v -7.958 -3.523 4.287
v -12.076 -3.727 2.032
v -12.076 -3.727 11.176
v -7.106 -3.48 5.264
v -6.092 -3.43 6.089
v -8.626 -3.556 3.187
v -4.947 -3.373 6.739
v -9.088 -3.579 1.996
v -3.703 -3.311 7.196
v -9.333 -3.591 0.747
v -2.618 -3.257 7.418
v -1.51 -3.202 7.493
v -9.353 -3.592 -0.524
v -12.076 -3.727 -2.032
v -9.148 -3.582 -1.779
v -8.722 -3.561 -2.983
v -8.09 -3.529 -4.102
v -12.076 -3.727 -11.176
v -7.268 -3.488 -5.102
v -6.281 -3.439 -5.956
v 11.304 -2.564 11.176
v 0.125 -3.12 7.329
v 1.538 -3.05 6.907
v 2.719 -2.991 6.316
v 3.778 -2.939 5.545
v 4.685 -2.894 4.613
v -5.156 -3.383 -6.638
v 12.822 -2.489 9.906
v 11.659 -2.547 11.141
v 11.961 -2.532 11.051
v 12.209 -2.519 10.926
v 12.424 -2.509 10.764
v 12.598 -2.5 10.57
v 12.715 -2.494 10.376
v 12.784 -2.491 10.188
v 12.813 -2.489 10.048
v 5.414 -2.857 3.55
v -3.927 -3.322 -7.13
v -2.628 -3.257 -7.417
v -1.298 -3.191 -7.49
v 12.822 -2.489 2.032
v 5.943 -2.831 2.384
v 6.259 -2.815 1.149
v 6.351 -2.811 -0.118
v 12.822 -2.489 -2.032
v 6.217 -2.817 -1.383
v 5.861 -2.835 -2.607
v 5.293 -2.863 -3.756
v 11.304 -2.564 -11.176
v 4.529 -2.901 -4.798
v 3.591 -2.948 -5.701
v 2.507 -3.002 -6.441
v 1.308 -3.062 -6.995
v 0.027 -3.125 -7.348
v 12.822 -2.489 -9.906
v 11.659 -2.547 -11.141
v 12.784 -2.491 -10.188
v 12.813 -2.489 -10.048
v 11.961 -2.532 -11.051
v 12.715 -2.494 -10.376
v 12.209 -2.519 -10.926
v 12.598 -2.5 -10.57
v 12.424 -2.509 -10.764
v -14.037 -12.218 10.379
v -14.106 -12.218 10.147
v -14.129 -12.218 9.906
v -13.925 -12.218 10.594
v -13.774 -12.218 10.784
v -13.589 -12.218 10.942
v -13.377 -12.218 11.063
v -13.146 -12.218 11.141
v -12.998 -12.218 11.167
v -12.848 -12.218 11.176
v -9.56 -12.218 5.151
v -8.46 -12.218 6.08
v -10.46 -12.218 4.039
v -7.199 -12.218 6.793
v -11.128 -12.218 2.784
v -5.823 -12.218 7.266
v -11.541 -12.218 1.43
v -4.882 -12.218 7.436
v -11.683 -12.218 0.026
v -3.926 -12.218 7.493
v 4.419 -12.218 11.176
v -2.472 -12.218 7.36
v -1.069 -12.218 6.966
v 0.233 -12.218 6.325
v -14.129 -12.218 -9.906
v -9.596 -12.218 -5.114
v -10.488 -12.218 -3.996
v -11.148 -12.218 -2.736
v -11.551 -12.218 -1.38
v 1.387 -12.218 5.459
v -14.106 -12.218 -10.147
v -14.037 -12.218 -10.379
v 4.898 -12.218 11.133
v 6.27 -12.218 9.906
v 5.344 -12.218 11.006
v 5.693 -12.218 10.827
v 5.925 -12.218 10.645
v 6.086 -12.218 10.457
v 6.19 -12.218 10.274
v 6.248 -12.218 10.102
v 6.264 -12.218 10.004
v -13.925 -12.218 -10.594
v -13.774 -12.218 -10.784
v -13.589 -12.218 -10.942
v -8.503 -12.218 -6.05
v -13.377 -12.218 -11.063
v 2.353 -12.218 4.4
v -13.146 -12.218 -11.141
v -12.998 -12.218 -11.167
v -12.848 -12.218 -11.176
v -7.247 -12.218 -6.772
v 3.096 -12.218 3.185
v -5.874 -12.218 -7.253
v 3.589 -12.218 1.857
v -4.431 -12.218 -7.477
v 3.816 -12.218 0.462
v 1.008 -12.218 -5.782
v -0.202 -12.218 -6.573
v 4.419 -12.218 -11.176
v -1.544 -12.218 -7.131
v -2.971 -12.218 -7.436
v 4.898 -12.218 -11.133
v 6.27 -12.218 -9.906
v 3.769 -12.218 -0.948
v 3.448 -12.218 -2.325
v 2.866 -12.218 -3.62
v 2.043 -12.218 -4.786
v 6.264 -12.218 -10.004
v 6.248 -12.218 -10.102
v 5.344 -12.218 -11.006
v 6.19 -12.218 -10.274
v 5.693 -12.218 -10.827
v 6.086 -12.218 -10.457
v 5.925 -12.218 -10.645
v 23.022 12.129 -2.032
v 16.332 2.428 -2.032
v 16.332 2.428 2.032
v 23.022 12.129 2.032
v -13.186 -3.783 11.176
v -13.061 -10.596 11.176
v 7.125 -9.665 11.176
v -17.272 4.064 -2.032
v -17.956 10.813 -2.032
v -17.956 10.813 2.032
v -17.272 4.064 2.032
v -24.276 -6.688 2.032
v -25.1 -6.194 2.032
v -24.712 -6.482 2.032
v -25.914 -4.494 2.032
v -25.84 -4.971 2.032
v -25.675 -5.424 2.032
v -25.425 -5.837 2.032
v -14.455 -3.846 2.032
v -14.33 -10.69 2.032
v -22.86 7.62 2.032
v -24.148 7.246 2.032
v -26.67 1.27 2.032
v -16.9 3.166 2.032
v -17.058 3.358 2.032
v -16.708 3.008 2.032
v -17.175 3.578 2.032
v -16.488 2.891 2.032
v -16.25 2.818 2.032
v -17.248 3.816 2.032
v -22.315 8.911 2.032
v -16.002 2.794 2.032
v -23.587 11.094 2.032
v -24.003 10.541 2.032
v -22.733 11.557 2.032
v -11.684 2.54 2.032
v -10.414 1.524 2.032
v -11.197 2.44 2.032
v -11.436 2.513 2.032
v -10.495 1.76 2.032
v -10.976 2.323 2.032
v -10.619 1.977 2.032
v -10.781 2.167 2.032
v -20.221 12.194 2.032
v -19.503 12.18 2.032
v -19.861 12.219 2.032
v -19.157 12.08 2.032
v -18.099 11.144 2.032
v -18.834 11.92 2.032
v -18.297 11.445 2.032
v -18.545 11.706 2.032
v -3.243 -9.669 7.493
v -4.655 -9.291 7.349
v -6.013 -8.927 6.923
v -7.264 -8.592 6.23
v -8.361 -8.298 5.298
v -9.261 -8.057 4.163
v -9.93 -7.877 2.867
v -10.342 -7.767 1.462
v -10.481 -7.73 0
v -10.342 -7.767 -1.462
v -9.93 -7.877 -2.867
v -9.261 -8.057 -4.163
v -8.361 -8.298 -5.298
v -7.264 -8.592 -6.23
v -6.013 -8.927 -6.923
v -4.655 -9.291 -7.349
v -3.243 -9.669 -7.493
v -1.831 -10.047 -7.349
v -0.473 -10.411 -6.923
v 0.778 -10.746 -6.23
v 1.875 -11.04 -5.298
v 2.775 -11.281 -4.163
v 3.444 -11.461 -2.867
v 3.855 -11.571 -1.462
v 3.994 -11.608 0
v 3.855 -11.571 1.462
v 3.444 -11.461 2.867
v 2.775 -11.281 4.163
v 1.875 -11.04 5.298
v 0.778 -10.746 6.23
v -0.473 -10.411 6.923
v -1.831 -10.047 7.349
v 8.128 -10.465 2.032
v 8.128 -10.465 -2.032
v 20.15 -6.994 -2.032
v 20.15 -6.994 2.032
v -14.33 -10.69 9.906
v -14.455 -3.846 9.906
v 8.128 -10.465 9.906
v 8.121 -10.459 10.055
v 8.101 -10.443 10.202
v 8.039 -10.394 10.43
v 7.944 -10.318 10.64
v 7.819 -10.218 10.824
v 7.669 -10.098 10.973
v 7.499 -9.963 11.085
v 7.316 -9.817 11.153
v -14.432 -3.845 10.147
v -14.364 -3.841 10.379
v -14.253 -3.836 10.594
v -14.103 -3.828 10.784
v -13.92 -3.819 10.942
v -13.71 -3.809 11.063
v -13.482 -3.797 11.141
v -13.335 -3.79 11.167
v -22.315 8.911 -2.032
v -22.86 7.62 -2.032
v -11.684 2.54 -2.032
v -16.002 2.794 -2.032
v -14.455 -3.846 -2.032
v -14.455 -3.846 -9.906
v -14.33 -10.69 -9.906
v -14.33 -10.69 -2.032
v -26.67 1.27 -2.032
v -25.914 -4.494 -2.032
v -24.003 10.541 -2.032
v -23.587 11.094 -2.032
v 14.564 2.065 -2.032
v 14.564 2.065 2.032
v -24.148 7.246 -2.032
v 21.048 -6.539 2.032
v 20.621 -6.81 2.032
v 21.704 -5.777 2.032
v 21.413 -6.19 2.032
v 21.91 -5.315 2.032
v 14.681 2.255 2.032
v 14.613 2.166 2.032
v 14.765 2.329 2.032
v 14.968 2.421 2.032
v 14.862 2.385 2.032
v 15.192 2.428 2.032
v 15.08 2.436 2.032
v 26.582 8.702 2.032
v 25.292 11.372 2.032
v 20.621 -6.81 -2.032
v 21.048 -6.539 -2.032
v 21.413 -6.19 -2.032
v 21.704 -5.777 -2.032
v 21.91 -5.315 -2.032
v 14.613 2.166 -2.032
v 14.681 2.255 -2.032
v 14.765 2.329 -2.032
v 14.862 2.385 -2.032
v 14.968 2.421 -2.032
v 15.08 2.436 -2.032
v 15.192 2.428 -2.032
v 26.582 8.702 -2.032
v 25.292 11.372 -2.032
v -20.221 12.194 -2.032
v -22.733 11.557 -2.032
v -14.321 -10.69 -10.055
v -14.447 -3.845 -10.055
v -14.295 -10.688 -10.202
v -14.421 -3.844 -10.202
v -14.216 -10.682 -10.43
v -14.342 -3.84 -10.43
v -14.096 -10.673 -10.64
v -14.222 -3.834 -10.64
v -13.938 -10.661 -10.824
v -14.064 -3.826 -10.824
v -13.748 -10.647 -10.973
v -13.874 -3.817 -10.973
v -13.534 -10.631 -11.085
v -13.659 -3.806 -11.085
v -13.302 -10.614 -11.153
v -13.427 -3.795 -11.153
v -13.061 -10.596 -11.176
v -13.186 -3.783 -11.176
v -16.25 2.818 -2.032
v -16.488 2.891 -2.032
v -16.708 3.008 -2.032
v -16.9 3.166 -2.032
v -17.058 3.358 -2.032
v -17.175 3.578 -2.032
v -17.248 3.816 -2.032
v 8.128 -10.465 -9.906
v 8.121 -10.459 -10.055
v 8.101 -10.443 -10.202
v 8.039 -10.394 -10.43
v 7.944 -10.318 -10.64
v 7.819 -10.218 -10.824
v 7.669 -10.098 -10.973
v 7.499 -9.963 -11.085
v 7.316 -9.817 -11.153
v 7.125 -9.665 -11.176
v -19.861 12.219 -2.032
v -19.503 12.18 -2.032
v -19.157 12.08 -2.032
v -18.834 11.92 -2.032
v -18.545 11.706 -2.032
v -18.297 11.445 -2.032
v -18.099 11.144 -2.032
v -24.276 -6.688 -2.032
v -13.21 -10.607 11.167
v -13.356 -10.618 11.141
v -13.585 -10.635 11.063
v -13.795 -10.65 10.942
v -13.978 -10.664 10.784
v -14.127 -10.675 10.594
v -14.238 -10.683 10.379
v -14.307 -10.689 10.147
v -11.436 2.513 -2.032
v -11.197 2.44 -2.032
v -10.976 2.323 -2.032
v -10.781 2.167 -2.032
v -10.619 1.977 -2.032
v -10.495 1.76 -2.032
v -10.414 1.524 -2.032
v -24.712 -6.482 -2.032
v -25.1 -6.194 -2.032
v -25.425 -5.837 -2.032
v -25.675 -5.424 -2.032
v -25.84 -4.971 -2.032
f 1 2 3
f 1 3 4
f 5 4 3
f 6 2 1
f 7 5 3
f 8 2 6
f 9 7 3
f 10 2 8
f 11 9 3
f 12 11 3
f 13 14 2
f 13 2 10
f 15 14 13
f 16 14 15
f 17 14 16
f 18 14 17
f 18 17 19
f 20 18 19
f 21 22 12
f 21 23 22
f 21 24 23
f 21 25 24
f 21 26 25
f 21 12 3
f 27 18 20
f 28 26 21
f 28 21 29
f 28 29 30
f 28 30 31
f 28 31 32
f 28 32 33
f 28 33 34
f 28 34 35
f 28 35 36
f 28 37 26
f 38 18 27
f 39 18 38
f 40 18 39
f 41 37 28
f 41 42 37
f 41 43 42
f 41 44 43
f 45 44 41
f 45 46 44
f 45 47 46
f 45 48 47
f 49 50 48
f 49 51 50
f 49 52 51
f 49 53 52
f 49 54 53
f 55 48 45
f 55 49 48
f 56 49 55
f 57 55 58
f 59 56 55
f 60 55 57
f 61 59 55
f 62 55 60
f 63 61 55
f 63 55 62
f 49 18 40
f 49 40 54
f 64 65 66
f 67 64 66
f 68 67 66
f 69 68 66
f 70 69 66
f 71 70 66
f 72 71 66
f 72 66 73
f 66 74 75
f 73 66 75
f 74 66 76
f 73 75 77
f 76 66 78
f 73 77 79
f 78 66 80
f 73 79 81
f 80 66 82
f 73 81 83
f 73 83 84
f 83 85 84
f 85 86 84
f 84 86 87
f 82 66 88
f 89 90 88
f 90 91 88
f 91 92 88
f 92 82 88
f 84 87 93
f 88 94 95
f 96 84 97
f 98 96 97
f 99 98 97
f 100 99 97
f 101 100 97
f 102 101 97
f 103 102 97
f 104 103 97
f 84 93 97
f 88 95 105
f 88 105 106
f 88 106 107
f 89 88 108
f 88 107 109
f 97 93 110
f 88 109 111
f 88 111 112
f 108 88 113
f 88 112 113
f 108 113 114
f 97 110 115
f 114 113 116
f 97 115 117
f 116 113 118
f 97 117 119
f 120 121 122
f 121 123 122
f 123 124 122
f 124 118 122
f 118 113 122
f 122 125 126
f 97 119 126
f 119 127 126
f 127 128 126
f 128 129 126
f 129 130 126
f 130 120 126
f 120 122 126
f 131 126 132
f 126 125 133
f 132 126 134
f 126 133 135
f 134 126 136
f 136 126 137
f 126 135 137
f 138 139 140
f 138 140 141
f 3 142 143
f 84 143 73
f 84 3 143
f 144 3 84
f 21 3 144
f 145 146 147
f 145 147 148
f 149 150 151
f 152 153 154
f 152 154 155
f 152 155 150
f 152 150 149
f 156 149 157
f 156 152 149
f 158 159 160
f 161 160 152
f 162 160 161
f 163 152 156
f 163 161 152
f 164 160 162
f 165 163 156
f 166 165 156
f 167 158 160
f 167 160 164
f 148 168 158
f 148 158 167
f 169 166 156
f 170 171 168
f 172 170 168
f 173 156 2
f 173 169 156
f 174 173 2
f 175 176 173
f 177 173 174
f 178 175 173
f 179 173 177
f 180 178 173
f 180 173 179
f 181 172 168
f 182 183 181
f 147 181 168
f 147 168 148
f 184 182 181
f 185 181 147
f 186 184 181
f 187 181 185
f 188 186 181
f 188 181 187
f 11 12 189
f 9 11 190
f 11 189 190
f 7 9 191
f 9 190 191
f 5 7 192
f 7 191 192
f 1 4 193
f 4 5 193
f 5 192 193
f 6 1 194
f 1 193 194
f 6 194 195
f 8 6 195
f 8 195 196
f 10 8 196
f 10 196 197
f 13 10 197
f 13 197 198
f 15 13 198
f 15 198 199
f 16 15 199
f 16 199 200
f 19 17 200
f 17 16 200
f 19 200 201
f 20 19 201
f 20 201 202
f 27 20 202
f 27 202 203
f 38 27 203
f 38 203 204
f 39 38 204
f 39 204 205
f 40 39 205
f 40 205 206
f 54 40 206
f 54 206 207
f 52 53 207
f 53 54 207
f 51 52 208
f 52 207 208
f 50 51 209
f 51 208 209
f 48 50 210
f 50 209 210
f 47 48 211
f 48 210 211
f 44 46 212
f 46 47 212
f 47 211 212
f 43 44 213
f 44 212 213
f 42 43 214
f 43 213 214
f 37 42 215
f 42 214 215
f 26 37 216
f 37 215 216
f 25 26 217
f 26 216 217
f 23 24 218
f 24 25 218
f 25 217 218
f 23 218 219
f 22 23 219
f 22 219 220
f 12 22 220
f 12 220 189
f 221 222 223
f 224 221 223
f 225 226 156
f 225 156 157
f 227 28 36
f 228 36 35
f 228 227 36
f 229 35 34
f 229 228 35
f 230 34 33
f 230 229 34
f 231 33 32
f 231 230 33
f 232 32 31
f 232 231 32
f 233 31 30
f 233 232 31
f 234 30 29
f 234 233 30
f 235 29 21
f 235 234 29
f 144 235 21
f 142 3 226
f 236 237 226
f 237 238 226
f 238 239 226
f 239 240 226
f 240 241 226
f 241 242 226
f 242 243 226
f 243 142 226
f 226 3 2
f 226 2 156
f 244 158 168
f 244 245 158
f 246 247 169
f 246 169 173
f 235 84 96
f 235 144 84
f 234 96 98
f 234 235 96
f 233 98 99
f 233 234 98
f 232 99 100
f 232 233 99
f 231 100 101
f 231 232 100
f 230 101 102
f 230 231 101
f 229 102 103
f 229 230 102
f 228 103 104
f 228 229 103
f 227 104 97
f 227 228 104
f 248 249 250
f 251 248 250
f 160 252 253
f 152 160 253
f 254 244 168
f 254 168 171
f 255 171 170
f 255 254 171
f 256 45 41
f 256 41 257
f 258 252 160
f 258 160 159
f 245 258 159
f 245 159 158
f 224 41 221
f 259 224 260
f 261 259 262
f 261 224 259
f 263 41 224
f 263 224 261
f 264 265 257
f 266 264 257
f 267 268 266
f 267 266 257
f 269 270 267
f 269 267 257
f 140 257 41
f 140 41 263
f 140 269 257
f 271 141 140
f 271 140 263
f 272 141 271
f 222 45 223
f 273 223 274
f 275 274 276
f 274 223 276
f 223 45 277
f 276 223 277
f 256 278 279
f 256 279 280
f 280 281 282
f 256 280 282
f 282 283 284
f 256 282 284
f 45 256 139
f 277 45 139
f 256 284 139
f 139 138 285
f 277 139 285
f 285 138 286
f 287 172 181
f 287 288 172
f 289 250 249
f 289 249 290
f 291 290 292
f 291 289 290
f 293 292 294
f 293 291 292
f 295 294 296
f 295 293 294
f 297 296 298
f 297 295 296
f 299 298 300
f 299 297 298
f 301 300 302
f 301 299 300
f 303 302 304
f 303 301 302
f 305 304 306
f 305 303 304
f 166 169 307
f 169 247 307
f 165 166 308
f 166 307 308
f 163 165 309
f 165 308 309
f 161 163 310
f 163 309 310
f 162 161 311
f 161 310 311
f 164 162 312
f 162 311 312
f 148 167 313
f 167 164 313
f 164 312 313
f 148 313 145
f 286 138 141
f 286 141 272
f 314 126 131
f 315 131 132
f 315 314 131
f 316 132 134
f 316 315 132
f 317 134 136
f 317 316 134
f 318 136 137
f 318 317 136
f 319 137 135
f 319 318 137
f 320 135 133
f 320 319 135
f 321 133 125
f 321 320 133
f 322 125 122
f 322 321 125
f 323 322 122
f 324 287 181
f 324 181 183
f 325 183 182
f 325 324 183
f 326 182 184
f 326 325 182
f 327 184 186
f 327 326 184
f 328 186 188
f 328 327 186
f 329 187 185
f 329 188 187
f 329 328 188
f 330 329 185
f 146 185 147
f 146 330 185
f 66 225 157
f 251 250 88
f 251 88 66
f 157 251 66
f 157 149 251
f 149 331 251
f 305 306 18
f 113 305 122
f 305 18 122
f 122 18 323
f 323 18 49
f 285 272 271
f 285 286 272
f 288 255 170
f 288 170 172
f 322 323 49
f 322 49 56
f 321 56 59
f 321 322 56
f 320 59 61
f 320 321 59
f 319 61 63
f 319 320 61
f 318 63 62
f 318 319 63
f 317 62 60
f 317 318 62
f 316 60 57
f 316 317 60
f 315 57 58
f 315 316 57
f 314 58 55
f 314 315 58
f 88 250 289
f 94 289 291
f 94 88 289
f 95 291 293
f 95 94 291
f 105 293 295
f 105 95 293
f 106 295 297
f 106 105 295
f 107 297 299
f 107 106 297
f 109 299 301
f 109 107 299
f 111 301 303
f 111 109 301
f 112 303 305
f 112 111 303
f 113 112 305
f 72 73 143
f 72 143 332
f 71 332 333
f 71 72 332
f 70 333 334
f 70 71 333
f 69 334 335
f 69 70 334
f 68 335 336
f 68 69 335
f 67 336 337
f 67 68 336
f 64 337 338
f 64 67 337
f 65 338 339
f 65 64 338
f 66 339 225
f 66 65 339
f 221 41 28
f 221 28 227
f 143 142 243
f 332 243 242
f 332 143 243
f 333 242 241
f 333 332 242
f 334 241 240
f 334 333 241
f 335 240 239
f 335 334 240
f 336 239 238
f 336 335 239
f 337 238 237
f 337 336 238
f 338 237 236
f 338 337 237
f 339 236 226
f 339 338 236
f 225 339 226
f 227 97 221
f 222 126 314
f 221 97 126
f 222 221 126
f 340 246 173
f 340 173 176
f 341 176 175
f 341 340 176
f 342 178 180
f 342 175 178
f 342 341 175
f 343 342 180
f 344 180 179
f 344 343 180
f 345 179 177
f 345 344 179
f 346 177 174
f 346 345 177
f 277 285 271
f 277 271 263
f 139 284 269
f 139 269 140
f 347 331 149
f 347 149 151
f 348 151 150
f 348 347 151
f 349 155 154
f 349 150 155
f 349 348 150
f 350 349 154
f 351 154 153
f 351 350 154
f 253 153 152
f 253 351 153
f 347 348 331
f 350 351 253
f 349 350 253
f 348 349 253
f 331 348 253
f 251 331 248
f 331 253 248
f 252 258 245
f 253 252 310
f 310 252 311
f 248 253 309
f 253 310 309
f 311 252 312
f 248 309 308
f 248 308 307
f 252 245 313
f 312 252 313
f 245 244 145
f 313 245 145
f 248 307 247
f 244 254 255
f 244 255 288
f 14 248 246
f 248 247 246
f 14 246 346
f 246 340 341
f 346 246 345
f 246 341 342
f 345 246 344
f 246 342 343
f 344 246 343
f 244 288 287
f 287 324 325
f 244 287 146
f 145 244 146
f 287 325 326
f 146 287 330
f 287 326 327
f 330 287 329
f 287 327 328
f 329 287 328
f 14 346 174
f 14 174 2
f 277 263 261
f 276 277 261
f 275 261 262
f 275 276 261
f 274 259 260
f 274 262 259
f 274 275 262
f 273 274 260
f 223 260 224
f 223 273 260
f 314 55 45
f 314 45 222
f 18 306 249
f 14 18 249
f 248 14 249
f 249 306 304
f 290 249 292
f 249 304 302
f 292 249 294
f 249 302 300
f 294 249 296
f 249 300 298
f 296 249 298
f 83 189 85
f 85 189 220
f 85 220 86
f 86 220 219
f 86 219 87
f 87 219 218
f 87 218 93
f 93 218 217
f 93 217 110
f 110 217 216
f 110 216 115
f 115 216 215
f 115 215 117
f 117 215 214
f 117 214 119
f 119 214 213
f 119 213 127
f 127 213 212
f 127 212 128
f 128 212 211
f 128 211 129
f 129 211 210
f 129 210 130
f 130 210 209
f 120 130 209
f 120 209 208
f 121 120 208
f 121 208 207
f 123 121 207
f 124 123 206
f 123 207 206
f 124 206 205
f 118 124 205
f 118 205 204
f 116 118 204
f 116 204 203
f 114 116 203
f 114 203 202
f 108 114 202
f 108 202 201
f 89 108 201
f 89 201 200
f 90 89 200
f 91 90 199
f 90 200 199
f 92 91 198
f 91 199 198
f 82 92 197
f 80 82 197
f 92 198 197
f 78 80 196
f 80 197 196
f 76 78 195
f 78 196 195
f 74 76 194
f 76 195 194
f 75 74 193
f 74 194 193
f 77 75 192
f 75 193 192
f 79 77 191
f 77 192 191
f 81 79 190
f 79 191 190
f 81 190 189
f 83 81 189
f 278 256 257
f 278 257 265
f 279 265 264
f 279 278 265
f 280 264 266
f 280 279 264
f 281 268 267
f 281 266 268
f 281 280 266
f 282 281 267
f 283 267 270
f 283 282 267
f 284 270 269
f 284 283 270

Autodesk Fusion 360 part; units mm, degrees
sketch "Sketch1" plane through (0, 0, 0) normal (0, 0, 1) x (1, 0, 0)
  line L0 (-26.67, 1.27) -> (-24.1476, 7.2462)
  line L1 (-24.1476, 7.2462) -> (-22.86, 7.62)
  line L2 (-22.86, 7.62) -> (-22.315, 8.9113)
  line L3 (-22.315, 8.9113) -> (-24.003, 10.541)
  line L4 (-23.5873, 11.0942) -> (-22.733, 11.557)
  line L5 (-22.733, 11.557) -> (-20.2207, 12.194)
  arc A0 (-17.9561, 10.8132) -> (-20.2207, 12.194) centre (-19.9, 10.1725) ccw
  arc A1 (-17.272, 4.064) -> (-16.002, 2.794) centre (-16.002, 4.064) ccw
  arc A2 (-10.414, 1.524) -> (-11.684, 2.54) centre (-11.7021, 1.2156) ccw
  line L6 (-16.002, 2.794) -> (-11.684, 2.54)
  line L7 (-17.9561, 10.8132) -> (-17.272, 4.064)
  line L8 (-10.414, 1.524) -> (-12.0756, -3.7274)
  line L9 (-12.0756, -3.7274) -> (12.8223, -2.4887)
  line L10 (12.8223, -2.4887) -> (14.564, 2.0647)
  arc A3 (15.1915, 2.428) -> (14.564, 2.0647) centre (15.0967, 1.8682) ccw
  line L11 (15.1915, 2.428) -> (16.3321, 2.428)
  line L12 (16.3321, 2.428) -> (23.0225, 12.1287)
  line L13 (23.0225, 12.1287) -> (25.292, 11.3722)
  line L14 (25.292, 11.3722) -> (26.5825, 8.7022)
  line L15 (26.5825, 8.7022) -> (21.9101, -5.3151)
  arc A4 (20.1504, -6.9936) -> (21.9101, -5.3151) centre (19.4463, -4.4938) ccw
  arc A5 (-25.9136, -4.4938) -> (-24.2756, -6.6881) centre (-23.4373, -4.3537) ccw
  line L16 (-26.67, 1.27) -> (-25.9136, -4.4938)
  line L17 (-24.2756, -6.6881) -> (-14.3296, -10.6903)
  line L18 (-14.3296, -10.6903) -> (-14.1291, -12.218)
  line L19 (-14.1291, -12.218) -> (6.2698, -12.218)
  line L20 (6.2698, -12.218) -> (8.1283, -10.465)
  line L21 (8.1283, -10.465) -> (20.1504, -6.9936)
  line L22 (-12.0756, -3.7274) -> (-14.4554, -3.8458)
  line L23 (-14.4554, -3.8458) -> (-14.3296, -10.6903)
  line L24 (12.8223, -2.4887) -> (8.1283, -10.465)
  line L25 (-24.003, 10.541) -> (-23.5873, 11.0942)
extrude "Extrude1" add sketch "Sketch1" along normal mid plane 4.064 contours L0 L1 L2 L3 L4 L5 A0 A1 A2 L6 L7 L8 A5 L16 L17 L22 L23 L25 | L10 A3 L11 L12 L13 L14 L15 A4 L21 L24 makes body 1 at (-19.0192, -1.7813, 2.032) makes body 2 at (21.6083, 1.9384, 2.032)
extrude "Extrude2" add sketch "Sketch1" along normal mid plane 22.352 contours L9 L18 L19 L20 L22 L23 L24 bodies 1 2
ref_plane "WorkPlane1" through (6.2698, -12.218, 0) normal (0.2588, 0.9659, 0) x (0, 0, 1)
sketch "Sketch4" plane through (6.2698, -12.218, 0) normal (0.2588, 0.9659, 0) x (0, 0, 1)
  line L0 (-11.176, -19.7038) -> (11.176, -19.7038)
  line L1 (-11.176, 0) -> (-11.176, -19.7038) construction
  circle A0 centre (0, -9.8486) radius 7.493
  point P0 (-11.176, 0)
  point P1 (-11.176, 0)
  point P2 (11.176, 0)
  point P3 (0, -9.8486)
  dimension "d6" = 22.352
  dimension "d7" = 19.7038
  dimension "d8" = 9.8552
  dimension "d9" = 11.176
  dimension "d10" = 14.986
extrude "Extrude3" cut sketch "Sketch4" along normal through all and the other way through all bodies 1
fillet "Fillet1" radius 1.27 8 edges at (10.4753, -6.4768, 11.176) (7.1991, -11.3415, 11.176) (-14.3925, -7.268, 11.176) (-14.2293, -11.4541, 11.176) (-14.3925, -7.268, -11.176) (-14.2293, -11.4541, -11.176) (10.4753, -6.4768, -11.176) (7.1991, -11.3415, -11.176) on bodies 1
